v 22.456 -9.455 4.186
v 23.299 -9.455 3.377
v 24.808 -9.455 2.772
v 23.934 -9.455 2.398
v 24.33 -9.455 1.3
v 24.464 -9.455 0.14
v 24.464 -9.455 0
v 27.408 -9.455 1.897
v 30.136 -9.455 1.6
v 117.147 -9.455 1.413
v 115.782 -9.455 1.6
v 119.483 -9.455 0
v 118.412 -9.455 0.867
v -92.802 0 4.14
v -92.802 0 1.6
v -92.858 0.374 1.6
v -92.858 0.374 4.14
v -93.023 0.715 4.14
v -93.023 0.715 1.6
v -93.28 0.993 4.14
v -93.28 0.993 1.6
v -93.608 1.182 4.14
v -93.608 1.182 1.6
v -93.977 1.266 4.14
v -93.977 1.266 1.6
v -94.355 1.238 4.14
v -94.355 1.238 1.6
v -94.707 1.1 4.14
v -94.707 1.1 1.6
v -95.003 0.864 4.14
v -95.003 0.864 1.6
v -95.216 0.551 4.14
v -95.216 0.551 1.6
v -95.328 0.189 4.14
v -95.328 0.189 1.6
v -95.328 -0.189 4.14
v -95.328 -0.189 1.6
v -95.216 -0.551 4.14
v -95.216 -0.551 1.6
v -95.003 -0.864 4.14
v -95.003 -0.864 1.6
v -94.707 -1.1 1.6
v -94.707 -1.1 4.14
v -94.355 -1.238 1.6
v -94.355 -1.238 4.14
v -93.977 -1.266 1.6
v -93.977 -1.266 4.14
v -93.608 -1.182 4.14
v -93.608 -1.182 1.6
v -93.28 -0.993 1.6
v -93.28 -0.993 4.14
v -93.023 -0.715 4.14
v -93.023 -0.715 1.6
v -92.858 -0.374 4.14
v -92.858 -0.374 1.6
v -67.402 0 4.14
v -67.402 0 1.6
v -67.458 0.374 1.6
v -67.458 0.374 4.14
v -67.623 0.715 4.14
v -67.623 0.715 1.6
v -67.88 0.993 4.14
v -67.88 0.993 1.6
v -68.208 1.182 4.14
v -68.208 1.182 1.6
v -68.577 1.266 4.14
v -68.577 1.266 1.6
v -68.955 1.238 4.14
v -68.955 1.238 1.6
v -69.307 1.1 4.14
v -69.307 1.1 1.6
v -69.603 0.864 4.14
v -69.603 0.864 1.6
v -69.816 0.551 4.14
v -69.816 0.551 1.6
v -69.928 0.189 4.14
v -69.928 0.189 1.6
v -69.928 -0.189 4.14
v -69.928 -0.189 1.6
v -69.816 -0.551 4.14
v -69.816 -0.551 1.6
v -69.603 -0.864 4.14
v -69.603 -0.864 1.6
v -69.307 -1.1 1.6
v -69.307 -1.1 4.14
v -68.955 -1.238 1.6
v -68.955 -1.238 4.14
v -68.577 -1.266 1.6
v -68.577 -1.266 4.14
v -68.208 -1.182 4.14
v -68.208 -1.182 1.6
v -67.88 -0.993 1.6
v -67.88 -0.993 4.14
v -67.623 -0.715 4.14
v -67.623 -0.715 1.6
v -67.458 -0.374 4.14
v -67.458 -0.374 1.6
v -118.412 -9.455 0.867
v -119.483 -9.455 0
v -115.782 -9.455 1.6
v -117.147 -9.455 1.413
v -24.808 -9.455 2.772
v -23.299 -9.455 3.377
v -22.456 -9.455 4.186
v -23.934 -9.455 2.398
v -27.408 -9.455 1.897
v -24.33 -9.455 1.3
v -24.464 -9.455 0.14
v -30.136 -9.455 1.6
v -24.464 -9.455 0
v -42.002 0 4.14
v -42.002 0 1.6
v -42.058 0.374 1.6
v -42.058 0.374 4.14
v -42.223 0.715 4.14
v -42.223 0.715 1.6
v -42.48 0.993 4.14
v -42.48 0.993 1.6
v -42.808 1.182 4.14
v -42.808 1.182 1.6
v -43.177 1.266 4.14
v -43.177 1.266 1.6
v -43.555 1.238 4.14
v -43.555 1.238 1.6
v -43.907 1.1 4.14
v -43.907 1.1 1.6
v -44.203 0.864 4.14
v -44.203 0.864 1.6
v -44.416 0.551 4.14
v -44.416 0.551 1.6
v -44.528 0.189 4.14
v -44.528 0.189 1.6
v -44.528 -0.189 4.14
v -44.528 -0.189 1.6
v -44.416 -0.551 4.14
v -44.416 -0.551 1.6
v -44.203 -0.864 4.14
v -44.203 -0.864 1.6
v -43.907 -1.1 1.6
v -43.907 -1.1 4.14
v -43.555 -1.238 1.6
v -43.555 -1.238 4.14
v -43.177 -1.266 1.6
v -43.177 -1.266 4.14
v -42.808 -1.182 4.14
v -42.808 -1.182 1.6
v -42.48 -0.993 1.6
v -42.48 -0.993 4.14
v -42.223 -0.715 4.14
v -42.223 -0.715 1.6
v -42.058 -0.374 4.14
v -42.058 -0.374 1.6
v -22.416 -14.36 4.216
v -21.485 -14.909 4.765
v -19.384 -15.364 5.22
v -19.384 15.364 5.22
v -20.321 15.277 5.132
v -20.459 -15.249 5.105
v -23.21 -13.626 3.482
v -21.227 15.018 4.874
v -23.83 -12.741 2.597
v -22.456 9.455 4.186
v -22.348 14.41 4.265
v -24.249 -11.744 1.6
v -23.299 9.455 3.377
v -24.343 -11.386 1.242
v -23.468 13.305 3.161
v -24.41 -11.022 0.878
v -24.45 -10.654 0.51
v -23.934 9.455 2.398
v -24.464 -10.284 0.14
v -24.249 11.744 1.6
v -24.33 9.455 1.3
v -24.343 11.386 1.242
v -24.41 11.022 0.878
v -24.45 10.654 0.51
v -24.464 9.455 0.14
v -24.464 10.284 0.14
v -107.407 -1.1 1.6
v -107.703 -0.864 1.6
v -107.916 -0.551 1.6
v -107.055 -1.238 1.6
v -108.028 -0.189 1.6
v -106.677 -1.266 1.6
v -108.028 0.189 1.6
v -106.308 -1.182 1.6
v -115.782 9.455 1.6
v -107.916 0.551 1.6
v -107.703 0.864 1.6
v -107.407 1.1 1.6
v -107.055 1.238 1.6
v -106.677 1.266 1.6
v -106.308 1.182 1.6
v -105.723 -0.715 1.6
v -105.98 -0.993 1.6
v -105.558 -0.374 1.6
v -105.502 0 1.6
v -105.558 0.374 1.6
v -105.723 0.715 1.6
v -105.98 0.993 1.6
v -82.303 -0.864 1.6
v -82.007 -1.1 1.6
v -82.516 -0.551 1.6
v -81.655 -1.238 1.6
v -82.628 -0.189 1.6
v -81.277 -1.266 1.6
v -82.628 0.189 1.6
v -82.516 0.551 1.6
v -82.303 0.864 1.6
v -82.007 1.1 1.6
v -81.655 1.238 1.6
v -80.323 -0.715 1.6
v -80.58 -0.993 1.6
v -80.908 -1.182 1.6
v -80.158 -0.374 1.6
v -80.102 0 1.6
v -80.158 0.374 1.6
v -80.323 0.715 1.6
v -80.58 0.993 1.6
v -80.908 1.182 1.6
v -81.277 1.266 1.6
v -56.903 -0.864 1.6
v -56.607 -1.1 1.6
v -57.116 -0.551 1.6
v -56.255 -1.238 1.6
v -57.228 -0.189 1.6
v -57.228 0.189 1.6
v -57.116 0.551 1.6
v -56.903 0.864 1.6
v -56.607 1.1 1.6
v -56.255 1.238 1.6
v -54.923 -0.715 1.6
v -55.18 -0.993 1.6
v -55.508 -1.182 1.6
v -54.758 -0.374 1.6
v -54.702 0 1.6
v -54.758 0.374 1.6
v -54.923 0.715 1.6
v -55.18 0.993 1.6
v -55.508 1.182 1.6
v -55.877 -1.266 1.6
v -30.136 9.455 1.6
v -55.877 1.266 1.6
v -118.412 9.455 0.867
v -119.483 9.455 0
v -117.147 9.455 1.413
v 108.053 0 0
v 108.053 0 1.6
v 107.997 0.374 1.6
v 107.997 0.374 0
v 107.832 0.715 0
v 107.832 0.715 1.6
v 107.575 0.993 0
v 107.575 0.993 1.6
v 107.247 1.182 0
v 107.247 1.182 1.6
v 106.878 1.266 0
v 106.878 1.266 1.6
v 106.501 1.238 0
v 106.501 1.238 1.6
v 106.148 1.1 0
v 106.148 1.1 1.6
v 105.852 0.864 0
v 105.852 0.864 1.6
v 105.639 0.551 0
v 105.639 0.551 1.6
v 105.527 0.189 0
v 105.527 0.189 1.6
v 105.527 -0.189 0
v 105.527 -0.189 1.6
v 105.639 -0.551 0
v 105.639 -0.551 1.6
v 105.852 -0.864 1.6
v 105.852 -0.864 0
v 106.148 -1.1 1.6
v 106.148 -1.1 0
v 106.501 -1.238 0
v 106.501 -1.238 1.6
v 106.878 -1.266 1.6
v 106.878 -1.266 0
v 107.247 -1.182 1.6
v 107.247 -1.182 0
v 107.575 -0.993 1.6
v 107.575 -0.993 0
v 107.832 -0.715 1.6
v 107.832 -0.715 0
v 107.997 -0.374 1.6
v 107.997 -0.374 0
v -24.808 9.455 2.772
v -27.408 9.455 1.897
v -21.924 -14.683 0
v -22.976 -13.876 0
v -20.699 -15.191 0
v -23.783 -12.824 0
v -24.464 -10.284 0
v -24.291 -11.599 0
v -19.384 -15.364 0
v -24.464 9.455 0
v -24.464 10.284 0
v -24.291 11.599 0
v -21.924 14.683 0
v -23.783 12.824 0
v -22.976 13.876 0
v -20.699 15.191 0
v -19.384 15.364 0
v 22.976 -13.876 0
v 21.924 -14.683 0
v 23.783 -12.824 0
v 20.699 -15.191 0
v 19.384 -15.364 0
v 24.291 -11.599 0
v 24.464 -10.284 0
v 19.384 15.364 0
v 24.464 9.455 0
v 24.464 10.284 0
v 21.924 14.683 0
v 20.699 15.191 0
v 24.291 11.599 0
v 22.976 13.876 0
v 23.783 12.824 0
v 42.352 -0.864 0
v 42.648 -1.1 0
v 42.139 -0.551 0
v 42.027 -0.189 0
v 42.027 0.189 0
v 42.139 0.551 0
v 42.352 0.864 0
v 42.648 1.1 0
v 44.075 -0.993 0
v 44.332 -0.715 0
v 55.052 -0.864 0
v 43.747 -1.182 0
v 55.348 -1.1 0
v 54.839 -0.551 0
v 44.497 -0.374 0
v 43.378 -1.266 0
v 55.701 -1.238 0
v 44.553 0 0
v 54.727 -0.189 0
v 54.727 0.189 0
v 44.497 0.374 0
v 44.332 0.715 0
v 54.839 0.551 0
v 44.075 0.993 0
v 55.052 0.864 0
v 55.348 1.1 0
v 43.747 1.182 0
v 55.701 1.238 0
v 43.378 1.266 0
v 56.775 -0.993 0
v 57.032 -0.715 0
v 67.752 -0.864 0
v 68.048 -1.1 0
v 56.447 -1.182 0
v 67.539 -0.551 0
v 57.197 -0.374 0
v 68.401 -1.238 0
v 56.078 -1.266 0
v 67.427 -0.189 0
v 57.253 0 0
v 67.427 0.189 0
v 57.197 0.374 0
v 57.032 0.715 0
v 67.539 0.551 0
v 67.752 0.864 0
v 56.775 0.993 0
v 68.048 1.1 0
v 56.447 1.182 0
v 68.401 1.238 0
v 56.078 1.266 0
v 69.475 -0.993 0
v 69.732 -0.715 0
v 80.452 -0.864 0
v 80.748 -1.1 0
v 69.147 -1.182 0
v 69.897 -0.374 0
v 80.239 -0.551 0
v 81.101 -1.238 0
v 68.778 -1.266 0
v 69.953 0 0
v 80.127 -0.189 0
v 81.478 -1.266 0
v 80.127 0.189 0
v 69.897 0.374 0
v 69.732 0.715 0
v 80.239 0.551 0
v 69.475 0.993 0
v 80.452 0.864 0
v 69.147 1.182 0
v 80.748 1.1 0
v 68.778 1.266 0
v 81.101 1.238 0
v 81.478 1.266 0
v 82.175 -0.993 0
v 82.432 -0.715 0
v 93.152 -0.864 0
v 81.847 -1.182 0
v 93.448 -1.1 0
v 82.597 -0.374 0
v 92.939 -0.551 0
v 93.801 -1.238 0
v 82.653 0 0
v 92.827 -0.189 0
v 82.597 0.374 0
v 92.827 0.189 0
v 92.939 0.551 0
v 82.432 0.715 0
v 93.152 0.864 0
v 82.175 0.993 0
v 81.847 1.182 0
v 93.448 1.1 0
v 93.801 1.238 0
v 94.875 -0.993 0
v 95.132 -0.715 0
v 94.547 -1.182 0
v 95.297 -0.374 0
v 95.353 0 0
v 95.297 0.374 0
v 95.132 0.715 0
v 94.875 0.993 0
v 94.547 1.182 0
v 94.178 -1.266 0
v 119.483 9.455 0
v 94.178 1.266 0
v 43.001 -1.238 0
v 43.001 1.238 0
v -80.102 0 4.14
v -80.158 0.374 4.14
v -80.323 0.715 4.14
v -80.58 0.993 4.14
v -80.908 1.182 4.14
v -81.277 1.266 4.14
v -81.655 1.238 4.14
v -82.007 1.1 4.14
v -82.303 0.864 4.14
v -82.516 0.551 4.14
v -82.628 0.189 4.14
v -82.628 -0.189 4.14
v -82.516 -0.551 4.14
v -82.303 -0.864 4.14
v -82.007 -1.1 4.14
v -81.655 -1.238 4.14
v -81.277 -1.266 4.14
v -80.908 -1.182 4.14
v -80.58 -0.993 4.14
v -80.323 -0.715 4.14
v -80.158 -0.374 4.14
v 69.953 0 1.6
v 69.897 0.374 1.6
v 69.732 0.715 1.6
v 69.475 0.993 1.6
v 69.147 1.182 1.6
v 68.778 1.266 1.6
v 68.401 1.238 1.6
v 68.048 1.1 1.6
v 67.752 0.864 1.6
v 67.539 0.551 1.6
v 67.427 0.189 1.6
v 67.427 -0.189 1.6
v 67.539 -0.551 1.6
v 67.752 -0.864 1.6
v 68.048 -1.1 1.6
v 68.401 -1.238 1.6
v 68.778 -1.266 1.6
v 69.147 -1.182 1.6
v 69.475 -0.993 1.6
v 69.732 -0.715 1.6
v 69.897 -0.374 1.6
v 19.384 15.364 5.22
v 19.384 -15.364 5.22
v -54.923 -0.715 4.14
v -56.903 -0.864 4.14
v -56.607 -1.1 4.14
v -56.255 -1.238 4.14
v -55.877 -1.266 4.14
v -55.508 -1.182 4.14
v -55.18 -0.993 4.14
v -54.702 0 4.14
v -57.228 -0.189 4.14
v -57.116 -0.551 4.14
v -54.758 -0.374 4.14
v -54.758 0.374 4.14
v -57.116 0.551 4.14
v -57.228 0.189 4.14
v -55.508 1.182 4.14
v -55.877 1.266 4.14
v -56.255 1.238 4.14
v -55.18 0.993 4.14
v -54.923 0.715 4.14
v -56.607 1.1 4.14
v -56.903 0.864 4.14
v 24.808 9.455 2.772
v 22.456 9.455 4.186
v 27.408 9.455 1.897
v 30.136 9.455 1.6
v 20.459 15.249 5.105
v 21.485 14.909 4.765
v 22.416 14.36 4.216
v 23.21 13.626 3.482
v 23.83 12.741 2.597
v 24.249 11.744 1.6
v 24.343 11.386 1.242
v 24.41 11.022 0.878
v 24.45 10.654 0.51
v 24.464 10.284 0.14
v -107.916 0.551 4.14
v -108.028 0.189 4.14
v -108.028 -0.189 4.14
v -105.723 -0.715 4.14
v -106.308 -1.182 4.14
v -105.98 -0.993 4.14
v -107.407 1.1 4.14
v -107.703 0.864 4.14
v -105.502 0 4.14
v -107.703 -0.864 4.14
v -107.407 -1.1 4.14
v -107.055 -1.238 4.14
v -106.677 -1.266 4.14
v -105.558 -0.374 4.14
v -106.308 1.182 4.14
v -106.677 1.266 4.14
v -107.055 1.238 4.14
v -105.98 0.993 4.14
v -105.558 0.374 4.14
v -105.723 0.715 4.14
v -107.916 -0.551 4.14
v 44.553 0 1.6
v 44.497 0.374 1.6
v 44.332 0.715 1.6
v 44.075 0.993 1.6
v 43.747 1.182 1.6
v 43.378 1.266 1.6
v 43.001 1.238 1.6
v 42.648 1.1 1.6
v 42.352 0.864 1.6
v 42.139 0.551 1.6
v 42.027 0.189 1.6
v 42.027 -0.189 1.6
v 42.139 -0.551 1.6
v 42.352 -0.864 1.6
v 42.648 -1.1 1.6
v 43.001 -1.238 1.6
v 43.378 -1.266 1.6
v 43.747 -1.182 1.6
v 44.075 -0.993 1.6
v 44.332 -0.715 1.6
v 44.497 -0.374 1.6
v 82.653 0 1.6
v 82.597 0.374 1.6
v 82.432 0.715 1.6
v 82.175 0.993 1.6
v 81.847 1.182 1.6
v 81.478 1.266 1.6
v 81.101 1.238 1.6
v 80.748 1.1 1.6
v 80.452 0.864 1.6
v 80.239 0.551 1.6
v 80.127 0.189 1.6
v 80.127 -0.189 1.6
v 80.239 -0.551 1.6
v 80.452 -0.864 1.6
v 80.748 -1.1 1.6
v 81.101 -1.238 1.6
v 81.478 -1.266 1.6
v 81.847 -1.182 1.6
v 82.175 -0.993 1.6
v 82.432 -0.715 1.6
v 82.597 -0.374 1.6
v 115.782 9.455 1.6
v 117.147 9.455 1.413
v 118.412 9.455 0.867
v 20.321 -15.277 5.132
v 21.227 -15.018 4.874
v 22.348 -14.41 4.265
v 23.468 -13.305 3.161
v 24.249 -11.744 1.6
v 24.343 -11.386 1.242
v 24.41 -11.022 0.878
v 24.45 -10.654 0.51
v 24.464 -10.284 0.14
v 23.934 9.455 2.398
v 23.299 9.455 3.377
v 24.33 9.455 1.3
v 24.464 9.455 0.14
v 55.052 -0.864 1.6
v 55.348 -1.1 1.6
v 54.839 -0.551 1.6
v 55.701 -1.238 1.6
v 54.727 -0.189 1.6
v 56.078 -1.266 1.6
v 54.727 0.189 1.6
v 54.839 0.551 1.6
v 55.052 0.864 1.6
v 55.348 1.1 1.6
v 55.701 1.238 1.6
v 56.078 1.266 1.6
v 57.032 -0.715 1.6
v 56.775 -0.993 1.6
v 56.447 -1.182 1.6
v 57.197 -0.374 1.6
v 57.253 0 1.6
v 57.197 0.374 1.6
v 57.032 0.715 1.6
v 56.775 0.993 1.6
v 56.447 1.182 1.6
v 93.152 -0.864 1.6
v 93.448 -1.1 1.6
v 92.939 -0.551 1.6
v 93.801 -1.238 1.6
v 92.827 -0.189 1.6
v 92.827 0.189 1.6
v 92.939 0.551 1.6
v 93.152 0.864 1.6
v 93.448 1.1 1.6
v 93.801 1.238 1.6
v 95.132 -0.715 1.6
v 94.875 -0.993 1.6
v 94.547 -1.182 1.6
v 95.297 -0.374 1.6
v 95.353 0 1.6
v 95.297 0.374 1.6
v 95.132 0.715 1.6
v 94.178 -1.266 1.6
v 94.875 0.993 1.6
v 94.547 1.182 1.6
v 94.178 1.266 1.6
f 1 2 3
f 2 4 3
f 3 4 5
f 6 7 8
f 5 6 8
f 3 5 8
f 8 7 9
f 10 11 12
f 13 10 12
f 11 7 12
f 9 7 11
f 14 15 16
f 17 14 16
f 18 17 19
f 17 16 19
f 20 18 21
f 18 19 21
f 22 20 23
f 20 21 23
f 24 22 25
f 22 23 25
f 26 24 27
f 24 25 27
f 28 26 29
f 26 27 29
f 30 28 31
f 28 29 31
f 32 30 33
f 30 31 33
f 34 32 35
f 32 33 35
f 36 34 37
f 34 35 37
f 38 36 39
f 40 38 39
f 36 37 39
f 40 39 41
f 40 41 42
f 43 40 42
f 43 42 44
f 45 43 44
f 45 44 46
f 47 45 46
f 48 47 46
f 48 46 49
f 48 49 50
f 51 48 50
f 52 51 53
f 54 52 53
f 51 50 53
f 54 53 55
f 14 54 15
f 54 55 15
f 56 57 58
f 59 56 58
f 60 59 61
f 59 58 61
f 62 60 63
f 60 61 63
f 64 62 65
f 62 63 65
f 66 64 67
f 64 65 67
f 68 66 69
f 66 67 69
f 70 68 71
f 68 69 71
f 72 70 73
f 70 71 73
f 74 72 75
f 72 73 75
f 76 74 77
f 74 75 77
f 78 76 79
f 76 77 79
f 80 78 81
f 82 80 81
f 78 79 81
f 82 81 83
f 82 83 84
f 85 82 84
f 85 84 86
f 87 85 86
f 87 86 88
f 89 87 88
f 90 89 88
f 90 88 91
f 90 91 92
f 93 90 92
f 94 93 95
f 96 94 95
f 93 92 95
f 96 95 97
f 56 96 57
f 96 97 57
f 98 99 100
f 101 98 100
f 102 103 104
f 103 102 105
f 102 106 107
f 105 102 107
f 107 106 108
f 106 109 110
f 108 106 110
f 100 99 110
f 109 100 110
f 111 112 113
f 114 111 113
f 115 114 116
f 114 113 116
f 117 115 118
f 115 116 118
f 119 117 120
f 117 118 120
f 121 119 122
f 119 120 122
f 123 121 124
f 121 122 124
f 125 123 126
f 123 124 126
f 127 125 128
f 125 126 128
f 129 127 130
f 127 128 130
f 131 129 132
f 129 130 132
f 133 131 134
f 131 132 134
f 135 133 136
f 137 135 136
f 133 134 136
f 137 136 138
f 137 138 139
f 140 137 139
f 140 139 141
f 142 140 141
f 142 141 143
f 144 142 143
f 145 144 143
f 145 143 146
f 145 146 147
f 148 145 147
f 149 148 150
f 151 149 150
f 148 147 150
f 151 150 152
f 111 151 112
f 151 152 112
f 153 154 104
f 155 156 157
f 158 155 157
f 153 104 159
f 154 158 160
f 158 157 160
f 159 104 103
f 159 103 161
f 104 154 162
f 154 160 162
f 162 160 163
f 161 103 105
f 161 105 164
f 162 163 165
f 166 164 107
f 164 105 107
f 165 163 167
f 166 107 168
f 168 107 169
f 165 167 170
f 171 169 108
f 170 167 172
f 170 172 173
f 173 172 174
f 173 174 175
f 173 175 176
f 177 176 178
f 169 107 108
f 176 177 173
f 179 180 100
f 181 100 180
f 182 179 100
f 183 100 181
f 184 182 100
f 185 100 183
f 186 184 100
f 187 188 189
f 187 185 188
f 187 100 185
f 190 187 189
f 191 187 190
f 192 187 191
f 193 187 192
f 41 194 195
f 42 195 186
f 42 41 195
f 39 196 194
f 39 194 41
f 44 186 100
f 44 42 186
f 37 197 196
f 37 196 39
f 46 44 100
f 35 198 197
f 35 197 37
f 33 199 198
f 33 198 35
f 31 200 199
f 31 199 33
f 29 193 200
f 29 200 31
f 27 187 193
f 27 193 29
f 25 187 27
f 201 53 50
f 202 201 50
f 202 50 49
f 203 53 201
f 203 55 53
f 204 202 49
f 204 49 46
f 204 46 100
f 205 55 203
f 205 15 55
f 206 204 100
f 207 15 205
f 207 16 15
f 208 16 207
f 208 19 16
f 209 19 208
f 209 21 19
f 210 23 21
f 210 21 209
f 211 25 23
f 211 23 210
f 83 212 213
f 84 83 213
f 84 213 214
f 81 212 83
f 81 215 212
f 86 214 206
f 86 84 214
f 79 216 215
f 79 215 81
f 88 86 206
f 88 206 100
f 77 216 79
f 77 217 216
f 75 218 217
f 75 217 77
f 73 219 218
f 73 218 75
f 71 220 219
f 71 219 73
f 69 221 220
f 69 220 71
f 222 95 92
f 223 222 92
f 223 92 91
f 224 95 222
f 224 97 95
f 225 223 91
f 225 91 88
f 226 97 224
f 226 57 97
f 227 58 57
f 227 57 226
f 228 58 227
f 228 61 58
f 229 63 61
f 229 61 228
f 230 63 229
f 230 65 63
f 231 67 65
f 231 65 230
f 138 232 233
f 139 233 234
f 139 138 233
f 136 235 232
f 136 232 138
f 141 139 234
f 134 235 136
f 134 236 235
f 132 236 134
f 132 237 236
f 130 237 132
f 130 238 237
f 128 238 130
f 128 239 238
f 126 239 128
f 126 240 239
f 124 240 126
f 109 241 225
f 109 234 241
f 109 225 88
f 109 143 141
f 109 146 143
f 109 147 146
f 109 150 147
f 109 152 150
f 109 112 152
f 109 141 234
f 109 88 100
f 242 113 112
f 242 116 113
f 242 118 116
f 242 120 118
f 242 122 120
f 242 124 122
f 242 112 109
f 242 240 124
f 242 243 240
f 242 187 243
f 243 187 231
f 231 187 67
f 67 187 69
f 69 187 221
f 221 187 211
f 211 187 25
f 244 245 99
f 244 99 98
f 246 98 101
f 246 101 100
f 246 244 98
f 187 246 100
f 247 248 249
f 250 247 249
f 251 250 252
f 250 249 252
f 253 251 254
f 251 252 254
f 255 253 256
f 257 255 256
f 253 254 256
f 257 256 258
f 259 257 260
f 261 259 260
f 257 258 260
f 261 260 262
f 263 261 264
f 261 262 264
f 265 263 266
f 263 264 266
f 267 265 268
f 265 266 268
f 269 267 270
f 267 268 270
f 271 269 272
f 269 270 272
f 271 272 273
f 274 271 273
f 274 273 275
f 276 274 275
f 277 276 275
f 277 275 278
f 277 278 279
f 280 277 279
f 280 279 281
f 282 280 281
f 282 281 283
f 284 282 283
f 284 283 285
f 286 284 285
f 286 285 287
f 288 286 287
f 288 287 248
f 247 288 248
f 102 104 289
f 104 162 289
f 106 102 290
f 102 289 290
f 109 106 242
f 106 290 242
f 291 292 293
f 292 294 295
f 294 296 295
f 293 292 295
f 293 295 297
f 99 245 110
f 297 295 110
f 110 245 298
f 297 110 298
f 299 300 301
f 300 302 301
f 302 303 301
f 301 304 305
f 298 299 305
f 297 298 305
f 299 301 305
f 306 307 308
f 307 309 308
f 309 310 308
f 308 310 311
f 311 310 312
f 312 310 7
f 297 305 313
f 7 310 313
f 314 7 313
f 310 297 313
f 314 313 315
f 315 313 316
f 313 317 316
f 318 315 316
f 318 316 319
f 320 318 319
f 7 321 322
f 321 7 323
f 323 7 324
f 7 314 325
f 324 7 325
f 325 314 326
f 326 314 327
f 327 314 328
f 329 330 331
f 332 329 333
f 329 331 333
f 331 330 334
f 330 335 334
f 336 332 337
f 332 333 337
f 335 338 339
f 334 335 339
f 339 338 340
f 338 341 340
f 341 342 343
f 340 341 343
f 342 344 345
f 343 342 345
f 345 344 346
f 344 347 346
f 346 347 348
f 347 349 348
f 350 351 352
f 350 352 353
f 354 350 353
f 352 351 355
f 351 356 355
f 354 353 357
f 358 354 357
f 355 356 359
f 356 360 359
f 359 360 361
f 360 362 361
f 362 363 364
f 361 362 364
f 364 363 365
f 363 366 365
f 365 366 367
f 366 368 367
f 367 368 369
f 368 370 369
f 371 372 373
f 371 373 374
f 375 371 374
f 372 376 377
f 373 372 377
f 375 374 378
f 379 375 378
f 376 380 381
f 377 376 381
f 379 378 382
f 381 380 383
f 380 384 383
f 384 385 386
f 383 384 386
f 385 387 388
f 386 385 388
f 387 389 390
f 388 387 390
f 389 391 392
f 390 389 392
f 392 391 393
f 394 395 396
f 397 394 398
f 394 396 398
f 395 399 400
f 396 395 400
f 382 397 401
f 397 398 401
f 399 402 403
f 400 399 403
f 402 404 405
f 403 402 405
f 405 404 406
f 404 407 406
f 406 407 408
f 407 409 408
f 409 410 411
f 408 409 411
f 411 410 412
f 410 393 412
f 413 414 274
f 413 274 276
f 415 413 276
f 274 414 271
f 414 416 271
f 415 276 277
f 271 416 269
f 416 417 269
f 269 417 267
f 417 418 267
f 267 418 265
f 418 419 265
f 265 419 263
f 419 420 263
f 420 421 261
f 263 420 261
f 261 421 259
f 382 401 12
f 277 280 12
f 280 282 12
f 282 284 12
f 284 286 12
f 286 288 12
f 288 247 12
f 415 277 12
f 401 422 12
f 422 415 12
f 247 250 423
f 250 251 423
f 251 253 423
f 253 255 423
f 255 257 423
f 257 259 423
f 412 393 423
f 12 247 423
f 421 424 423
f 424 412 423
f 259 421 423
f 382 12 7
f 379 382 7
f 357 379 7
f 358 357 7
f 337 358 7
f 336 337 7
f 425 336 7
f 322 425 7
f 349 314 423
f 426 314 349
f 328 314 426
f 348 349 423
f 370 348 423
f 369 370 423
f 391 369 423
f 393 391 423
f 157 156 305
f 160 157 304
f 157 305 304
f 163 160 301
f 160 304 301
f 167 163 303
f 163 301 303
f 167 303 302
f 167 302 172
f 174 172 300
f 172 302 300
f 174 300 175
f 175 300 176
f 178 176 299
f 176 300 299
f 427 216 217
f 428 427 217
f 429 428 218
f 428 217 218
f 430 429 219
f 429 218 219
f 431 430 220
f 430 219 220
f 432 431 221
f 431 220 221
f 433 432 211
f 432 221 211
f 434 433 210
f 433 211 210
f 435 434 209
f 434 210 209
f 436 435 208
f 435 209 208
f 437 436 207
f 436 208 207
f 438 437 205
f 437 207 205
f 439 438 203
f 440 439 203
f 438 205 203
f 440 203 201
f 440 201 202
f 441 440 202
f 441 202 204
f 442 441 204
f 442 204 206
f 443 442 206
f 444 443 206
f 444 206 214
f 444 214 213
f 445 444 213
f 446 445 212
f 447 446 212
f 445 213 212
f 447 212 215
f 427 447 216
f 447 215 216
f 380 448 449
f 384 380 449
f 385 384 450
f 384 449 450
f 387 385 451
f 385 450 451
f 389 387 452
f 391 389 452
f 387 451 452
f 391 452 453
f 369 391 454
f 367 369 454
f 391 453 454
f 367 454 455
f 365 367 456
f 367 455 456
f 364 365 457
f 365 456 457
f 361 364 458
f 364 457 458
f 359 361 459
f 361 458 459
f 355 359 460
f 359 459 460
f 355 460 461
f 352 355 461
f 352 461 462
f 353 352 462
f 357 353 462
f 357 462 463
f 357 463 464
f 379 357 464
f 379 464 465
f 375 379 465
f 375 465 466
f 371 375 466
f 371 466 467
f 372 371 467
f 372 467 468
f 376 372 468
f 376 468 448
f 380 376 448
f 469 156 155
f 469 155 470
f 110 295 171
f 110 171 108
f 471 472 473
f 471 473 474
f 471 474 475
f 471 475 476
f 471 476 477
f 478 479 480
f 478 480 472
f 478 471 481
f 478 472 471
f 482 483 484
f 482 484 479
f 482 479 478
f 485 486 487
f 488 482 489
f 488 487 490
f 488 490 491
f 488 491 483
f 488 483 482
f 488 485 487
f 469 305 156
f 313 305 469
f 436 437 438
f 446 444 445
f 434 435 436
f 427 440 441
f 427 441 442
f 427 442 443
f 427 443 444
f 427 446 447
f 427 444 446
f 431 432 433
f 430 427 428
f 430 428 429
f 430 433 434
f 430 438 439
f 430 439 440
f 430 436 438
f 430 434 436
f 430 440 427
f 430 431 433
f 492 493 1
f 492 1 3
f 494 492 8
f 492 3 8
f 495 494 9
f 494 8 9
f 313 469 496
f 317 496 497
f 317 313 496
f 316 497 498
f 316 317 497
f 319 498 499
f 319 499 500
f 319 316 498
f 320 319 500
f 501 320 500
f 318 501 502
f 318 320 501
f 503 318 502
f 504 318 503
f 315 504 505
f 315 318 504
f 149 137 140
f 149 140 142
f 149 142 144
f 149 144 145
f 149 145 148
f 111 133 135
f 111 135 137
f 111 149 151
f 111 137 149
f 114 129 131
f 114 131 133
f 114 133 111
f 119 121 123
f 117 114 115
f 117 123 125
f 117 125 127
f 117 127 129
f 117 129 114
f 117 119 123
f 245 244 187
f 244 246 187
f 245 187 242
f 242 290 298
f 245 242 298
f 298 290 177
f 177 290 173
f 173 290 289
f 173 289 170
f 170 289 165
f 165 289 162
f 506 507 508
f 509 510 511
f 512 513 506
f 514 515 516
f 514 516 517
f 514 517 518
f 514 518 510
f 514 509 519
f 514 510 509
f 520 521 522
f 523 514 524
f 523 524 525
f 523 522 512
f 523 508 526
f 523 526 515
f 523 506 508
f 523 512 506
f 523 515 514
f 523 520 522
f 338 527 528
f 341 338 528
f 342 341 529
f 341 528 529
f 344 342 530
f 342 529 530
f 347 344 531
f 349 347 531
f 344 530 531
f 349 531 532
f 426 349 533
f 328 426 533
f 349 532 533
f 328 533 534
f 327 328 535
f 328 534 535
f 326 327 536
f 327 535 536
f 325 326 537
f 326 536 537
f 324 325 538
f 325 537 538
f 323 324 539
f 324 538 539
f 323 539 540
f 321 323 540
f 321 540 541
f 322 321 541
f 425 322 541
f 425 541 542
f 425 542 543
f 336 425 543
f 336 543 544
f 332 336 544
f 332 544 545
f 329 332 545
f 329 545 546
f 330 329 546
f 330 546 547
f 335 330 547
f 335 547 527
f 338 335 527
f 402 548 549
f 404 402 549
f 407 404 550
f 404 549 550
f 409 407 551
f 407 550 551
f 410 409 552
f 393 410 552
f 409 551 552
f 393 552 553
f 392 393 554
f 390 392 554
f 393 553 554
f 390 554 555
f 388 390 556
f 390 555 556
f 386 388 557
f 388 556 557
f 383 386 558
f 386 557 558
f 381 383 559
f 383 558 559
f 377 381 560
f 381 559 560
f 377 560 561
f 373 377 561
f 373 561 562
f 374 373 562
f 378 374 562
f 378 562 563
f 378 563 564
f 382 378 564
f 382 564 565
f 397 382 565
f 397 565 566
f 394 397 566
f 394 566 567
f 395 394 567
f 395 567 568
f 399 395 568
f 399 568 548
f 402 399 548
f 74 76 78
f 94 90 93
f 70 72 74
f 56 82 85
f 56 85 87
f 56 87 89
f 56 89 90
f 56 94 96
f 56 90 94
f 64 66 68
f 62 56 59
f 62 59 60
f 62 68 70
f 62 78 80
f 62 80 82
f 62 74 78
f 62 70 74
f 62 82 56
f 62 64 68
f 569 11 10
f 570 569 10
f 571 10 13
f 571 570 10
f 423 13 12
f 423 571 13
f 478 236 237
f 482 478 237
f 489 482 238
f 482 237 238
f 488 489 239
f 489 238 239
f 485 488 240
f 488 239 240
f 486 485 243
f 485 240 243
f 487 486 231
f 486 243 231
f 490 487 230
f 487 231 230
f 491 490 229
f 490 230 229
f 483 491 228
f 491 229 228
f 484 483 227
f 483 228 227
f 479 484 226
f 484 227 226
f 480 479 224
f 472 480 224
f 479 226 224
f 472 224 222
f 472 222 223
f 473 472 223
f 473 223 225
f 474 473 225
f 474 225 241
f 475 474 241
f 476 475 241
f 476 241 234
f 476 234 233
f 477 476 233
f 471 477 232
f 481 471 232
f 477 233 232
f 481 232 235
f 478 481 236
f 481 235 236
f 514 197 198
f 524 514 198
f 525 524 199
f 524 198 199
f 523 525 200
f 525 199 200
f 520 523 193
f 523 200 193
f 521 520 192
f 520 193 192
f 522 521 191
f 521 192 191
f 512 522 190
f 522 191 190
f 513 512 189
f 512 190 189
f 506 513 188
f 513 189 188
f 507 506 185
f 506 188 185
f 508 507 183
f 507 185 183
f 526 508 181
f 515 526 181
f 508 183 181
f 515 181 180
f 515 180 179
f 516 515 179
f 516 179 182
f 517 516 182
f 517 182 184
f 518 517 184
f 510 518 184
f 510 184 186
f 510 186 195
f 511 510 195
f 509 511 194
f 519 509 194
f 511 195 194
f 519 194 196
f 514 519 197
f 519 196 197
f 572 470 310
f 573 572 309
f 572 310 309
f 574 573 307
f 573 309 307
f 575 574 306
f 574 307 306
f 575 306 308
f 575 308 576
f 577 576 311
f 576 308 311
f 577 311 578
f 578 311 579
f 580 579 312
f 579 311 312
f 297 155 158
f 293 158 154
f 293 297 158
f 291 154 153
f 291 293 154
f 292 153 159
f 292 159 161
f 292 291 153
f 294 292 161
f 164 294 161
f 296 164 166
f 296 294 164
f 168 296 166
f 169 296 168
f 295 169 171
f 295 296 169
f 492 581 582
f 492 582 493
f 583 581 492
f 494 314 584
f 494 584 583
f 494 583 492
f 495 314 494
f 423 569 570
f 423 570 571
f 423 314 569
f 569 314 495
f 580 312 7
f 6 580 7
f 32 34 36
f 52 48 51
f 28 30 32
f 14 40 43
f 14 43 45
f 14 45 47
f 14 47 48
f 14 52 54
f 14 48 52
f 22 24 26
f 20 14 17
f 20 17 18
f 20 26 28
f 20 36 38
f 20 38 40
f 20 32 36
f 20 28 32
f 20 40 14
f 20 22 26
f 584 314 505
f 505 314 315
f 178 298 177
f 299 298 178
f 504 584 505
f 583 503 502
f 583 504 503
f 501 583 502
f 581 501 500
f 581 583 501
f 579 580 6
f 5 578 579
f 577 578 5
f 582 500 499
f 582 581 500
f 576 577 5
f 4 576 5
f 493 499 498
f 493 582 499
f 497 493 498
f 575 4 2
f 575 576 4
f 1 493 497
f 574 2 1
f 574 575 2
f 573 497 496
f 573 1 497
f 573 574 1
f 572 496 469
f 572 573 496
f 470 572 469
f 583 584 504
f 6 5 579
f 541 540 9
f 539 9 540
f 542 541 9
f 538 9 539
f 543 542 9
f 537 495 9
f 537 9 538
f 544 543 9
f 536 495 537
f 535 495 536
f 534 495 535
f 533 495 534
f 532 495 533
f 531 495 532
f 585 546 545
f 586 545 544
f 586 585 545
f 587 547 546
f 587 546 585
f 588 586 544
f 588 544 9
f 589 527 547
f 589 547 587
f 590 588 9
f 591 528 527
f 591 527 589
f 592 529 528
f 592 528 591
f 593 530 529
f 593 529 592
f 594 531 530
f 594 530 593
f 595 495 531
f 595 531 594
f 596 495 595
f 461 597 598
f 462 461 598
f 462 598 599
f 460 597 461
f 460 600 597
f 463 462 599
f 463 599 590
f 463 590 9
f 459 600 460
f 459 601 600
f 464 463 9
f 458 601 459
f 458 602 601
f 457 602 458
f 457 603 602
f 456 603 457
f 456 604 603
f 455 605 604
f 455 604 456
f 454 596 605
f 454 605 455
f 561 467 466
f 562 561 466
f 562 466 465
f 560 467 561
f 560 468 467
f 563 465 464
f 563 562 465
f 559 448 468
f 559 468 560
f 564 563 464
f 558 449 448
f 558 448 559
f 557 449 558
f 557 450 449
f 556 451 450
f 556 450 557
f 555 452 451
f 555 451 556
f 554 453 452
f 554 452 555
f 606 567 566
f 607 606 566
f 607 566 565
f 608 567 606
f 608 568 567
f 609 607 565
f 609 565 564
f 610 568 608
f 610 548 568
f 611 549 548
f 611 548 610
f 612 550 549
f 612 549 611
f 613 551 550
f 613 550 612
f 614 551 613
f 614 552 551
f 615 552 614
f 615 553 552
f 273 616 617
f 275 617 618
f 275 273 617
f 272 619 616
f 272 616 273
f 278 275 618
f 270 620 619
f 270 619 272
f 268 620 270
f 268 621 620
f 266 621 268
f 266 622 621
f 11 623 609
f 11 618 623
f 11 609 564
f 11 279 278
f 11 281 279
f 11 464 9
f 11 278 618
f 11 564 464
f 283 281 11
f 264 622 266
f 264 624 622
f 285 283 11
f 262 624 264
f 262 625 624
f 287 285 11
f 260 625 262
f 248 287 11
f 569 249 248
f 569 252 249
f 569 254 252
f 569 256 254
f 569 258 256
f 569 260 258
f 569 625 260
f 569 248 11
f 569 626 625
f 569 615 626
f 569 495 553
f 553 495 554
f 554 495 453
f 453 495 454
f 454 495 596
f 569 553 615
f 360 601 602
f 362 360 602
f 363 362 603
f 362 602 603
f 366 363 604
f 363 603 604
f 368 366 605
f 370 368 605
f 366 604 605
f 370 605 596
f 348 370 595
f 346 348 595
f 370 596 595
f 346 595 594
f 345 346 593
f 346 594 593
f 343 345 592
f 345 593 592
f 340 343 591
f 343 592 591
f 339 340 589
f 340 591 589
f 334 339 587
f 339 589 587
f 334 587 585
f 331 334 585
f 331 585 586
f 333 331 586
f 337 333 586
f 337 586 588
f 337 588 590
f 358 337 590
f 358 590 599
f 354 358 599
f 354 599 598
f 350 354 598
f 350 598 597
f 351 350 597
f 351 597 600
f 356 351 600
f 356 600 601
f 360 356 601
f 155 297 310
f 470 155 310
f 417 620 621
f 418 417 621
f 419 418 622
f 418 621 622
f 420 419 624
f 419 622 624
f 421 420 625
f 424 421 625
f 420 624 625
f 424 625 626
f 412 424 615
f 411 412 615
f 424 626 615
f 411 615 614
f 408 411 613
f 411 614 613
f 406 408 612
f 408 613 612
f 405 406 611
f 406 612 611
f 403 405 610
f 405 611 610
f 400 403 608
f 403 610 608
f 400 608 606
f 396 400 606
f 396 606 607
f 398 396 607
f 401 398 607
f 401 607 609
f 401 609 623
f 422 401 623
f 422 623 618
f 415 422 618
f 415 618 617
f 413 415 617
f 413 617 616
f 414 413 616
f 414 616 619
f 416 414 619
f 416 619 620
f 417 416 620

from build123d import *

# Parameters (mm, degrees)
F0_W         = 95.0192604214
F0_H         = 18.9093053341
F1_DEPTH     = 1.6002
F2_R         = 1.27
F3_DEPTH     = 25.4
F4_R         = 1.27
F5_DEPTH     = 2.54
F6_W         = 48.927821219
F6_H         = 30.7276230305
F7_DEPTH     = 3.6195
F8_T1_DEPTH  = 30.6197
F8_T6_DEPTH  = 56.1276230305
F8_T12_DEPTH = 56.1276230305
F8_T18_DEPTH = 56.1276230305
F8_T25_DEPTH = 56.1276230305
F8_T31_DEPTH = 56.1276230305
F8_T37_DEPTH = 56.1276230305
F8_T43_DEPTH = 56.1276230305
F8_T49_DEPTH = 56.1276230305
F8_T56_DEPTH = 56.1276230305
F8_T62_DEPTH = 56.1276230305
F9_T1_DEPTH  = 37.4142992276
F10_R        = 12.7


# Not quite as in the source:
# - a fillet or chamfer that OpenCascade refuses, or shapes differently, is made with other operations: its cross-section is extruded or revolved along the edge and cut away or added


with BuildPart() as f1:
    # F0 (on Top) → F1 (new body)
    with BuildSketch(Plane.XY):
        Polygon((-24.4639106095, -15.3638115153), (24.4639106095, -15.3638115153), (24.4639106095, -9.454652667), (24.4639106095, 9.454652667), (24.4639106095, 15.3638115153), (-24.4639106095, 15.3638115153), (-24.4639106095, 9.454652667), (-24.4639106095, -9.454652667), align=None)
        with Locations((71.9735408202, 0)):
            Rectangle(F0_W, F0_H)
        with Locations((-71.9735408202, 0)):
            Rectangle(F0_W, F0_H)
    extrude(amount=F1_DEPTH)

    # F2 (on face) → F3 (cut)
    with BuildSketch(Plane.XY.offset(1.6002)):
        with Locations((106.7831710309, 0)):
            Circle(F2_R)
        with Locations((94.0831710309, 0)):
            Circle(F2_R)
        with Locations((81.3831710309, 0)):
            Circle(F2_R)
        with Locations((68.6831710309, 0)):
            Circle(F2_R)
        with Locations((55.9831710309, 0)):
            Circle(F2_R)
        with Locations((43.2831710309, 0)):
            Circle(F2_R)
    extrude(amount=-F3_DEPTH, mode=Mode.SUBTRACT)

    # F4 (on face) → F5 (join)
    with BuildSketch(Plane.XY.offset(1.6002)):
        with Locations((-106.7719441229, 0)):
            Circle(F4_R)
        with Locations((-94.0719441229, 0)):
            Circle(F4_R)
        with Locations((-81.3719441229, 0)):
            Circle(F4_R)
        with Locations((-68.6719441229, 0)):
            Circle(F4_R)
        with Locations((-55.9719441229, 0)):
            Circle(F4_R)
        with Locations((-43.2719441229, 0)):
            Circle(F4_R)
    extrude(amount=F5_DEPTH)

    # F6 (on face) → F7 (join)
    with BuildSketch(Plane.XY.offset(1.6002)):
        Rectangle(F6_W, F6_H)
    extrude(amount=F7_DEPTH)

    # F8: fillet of radius 5.08 on 6 edges, made by hand

    # F8_s2 → F8_t1 (cut)
    with BuildSketch(Plane.XY.offset(-12.7)):
        with BuildLine():
            ThreePointArc((-19.3839106095, 15.3638115153), (-22.9760130579, 13.8759139637), (-24.4639106095, 10.2838115153))
            Line((-24.4639106095, 10.2838115153), (-24.4639106095, 15.3638115153))
            Line((-24.4639106095, 15.3638115153), (-19.3839106095, 15.3638115153))
        make_face()
        with BuildLine():
            ThreePointArc((-19.3839106095, -15.3638115153), (-22.9760130579, -13.8759139637), (-24.4639106095, -10.2838115153))
            Line((-24.4639106095, -10.2838115153), (-24.4639106095, -15.3638115153))
            Line((-24.4639106095, -15.3638115153), (-19.3839106095, -15.3638115153))
        make_face()
        with BuildLine():
            ThreePointArc((19.3839106095, -15.3638115153), (22.9760130579, -13.8759139637), (24.4639106095, -10.2838115153))
            Line((24.4639106095, -10.2838115153), (24.4639106095, -15.3638115153))
            Line((24.4639106095, -15.3638115153), (19.3839106095, -15.3638115153))
        make_face()
        with BuildLine():
            ThreePointArc((19.3839106095, 15.3638115153), (22.9760130579, 13.8759139637), (24.4639106095, 10.2838115153))
            Line((24.4639106095, 10.2838115153), (24.4639106095, 15.3638115153))
            Line((24.4639106095, 15.3638115153), (19.3839106095, 15.3638115153))
        make_face()
    extrude(amount=F8_T1_DEPTH, mode=Mode.SUBTRACT)


with BuildPart() as f8_tool4:
    # F8_s5 → F8_t6 (new body)
    with BuildSketch(Plane.XZ.offset(28.0638115153)):
        with BuildLine():
            ThreePointArc((24.4639106095, 0.1397), (22.9760130579, 3.7318024484), (19.3839106095, 5.2197))
            Line((19.3839106095, 5.2197), (24.4639106095, 5.2197))
            Line((24.4639106095, 5.2197), (24.4639106095, 0.1397))
        make_face()
    extrude(amount=-F8_T6_DEPTH)

    split(bisect_by=Plane.XY.offset(1.6002), keep=Keep.BOTTOM)

    split(bisect_by=Plane.XZ.offset(9.454652667), keep=Keep.TOP)


with BuildPart() as f1_1:
    add(f1.part)

    # F8_t3: cut F8_tool4
    add(f8_tool4.part, mode=Mode.SUBTRACT)


with BuildPart() as f8_tool10:
    # F8_s11 → F8_t12 (new body)
    with BuildSketch(Plane.XZ.offset(28.0638115153)):
        with BuildLine():
            ThreePointArc((24.4639106095, 0.1397), (22.9760130579, 3.7318024484), (19.3839106095, 5.2197))
            Line((19.3839106095, 5.2197), (24.4639106095, 5.2197))
            Line((24.4639106095, 5.2197), (24.4639106095, 0.1397))
        make_face()
    extrude(amount=-F8_T12_DEPTH)

    split(bisect_by=Plane.XY.offset(1.6002), keep=Keep.TOP)

    split(bisect_by=Plane.XZ.offset(9.454652667), keep=Keep.TOP)


with BuildPart() as f1_2:
    add(f1_1.part)

    # F8_t9: cut F8_tool10
    add(f8_tool10.part, mode=Mode.SUBTRACT)


with BuildPart() as f8_tool16:
    # F8_s17 → F8_t18 (new body)
    with BuildSketch(Plane.XZ.offset(28.0638115153)):
        with BuildLine():
            ThreePointArc((24.4639106095, 0.1397), (22.9760130579, 3.7318024484), (19.3839106095, 5.2197))
            Line((19.3839106095, 5.2197), (24.4639106095, 5.2197))
            Line((24.4639106095, 5.2197), (24.4639106095, 0.1397))
        make_face()
    extrude(amount=-F8_T18_DEPTH)

    split(bisect_by=Plane.XY.offset(1.6002), keep=Keep.TOP)

    split(bisect_by=Plane.XZ.offset(-9.454652667), keep=Keep.TOP)

    split(bisect_by=Plane.XZ.offset(9.454652667), keep=Keep.BOTTOM)


with BuildPart() as f1_3:
    add(f1_2.part)

    # F8_t15: cut F8_tool16
    add(f8_tool16.part, mode=Mode.SUBTRACT)


with BuildPart() as f8_tool23:
    # F8_s24 → F8_t25 (new body)
    with BuildSketch(Plane.XZ.offset(28.0638115153)):
        with BuildLine():
            ThreePointArc((24.4639106095, 0.1397), (22.9760130579, 3.7318024484), (19.3839106095, 5.2197))
            Line((19.3839106095, 5.2197), (24.4639106095, 5.2197))
            Line((24.4639106095, 5.2197), (24.4639106095, 0.1397))
        make_face()
    extrude(amount=-F8_T25_DEPTH)

    split(bisect_by=Plane.XY.offset(1.6002), keep=Keep.BOTTOM)

    split(bisect_by=Plane.XZ.offset(-9.454652667), keep=Keep.BOTTOM)


with BuildPart() as f1_4:
    add(f1_3.part)

    # F8_t22: cut F8_tool23
    add(f8_tool23.part, mode=Mode.SUBTRACT)


with BuildPart() as f8_tool29:
    # F8_s30 → F8_t31 (new body)
    with BuildSketch(Plane.XZ.offset(28.0638115153)):
        with BuildLine():
            ThreePointArc((24.4639106095, 0.1397), (22.9760130579, 3.7318024484), (19.3839106095, 5.2197))
            Line((19.3839106095, 5.2197), (24.4639106095, 5.2197))
            Line((24.4639106095, 5.2197), (24.4639106095, 0.1397))
        make_face()
    extrude(amount=-F8_T31_DEPTH)

    split(bisect_by=Plane.XY.offset(1.6002), keep=Keep.TOP)

    split(bisect_by=Plane.XZ.offset(-9.454652667), keep=Keep.BOTTOM)


with BuildPart() as f1_5:
    add(f1_4.part)

    # F8_t28: cut F8_tool29
    add(f8_tool29.part, mode=Mode.SUBTRACT)


with BuildPart() as f8_tool35:
    # F8_s36 → F8_t37 (new body)
    with BuildSketch(Plane.XZ.offset(-28.0638115153)):
        with BuildLine():
            ThreePointArc((-19.3839106095, 5.2197), (-22.9760130579, 3.7318024484), (-24.4639106095, 0.1397))
            Line((-24.4639106095, 0.1397), (-24.4639106095, 5.2197))
            Line((-24.4639106095, 5.2197), (-19.3839106095, 5.2197))
        make_face()
    extrude(amount=F8_T37_DEPTH)

    split(bisect_by=Plane.XZ.offset(-9.454652667), keep=Keep.BOTTOM)

    split(bisect_by=Plane.XY.offset(1.6002), keep=Keep.TOP)


with BuildPart() as f1_6:
    add(f1_5.part)

    # F8_t34: cut F8_tool35
    add(f8_tool35.part, mode=Mode.SUBTRACT)


with BuildPart() as f8_tool41:
    # F8_s42 → F8_t43 (new body)
    with BuildSketch(Plane.XZ.offset(-28.0638115153)):
        with BuildLine():
            ThreePointArc((-19.3839106095, 5.2197), (-22.9760130579, 3.7318024484), (-24.4639106095, 0.1397))
            Line((-24.4639106095, 0.1397), (-24.4639106095, 5.2197))
            Line((-24.4639106095, 5.2197), (-19.3839106095, 5.2197))
        make_face()
    extrude(amount=F8_T43_DEPTH)

    split(bisect_by=Plane.XZ.offset(-9.454652667), keep=Keep.BOTTOM)

    split(bisect_by=Plane.XY.offset(1.6002), keep=Keep.BOTTOM)


with BuildPart() as f1_7:
    add(f1_6.part)

    # F8_t40: cut F8_tool41
    add(f8_tool41.part, mode=Mode.SUBTRACT)


with BuildPart() as f8_tool47:
    # F8_s48 → F8_t49 (new body)
    with BuildSketch(Plane.XZ.offset(-28.0638115153)):
        with BuildLine():
            ThreePointArc((-19.3839106095, 5.2197), (-22.9760130579, 3.7318024484), (-24.4639106095, 0.1397))
            Line((-24.4639106095, 0.1397), (-24.4639106095, 5.2197))
            Line((-24.4639106095, 5.2197), (-19.3839106095, 5.2197))
        make_face()
    extrude(amount=F8_T49_DEPTH)

    split(bisect_by=Plane.XZ.offset(-9.454652667), keep=Keep.TOP)

    split(bisect_by=Plane.XY.offset(1.6002), keep=Keep.TOP)

    split(bisect_by=Plane.XZ.offset(9.454652667), keep=Keep.BOTTOM)


with BuildPart() as f1_8:
    add(f1_7.part)

    # F8_t46: cut F8_tool47
    add(f8_tool47.part, mode=Mode.SUBTRACT)


with BuildPart() as f8_tool54:
    # F8_s55 → F8_t56 (new body)
    with BuildSketch(Plane.XZ.offset(-28.0638115153)):
        with BuildLine():
            ThreePointArc((-19.3839106095, 5.2197), (-22.9760130579, 3.7318024484), (-24.4639106095, 0.1397))
            Line((-24.4639106095, 0.1397), (-24.4639106095, 5.2197))
            Line((-24.4639106095, 5.2197), (-19.3839106095, 5.2197))
        make_face()
    extrude(amount=F8_T56_DEPTH)

    split(bisect_by=Plane.XY.offset(1.6002), keep=Keep.TOP)

    split(bisect_by=Plane.XZ.offset(9.454652667), keep=Keep.TOP)


with BuildPart() as f1_9:
    add(f1_8.part)

    # F8_t53: cut F8_tool54
    add(f8_tool54.part, mode=Mode.SUBTRACT)


with BuildPart() as f8_tool60:
    # F8_s61 → F8_t62 (new body)
    with BuildSketch(Plane.XZ.offset(-28.0638115153)):
        with BuildLine():
            ThreePointArc((-19.3839106095, 5.2197), (-22.9760130579, 3.7318024484), (-24.4639106095, 0.1397))
            Line((-24.4639106095, 0.1397), (-24.4639106095, 5.2197))
            Line((-24.4639106095, 5.2197), (-19.3839106095, 5.2197))
        make_face()
    extrude(amount=F8_T62_DEPTH)

    split(bisect_by=Plane.XY.offset(1.6002), keep=Keep.BOTTOM)

    split(bisect_by=Plane.XZ.offset(9.454652667), keep=Keep.TOP)


with BuildPart() as f1_10:
    add(f1_9.part)

    # F8_t59: cut F8_tool60
    add(f8_tool60.part, mode=Mode.SUBTRACT)

    # F9: fillet of radius 5.08 on 2 edges, made by hand

    # F9_s2 → F9_t1 (cut)
    with BuildSketch(Plane.XZ.offset(-18.7071496138)):
        with BuildLine():
            ThreePointArc((115.7821722522, 1.6002), (117.7982347512, 1.1830201767), (119.4831710309, 0))
            Line((119.4831710309, 0), (119.4831710309, 1.6002))
            Line((119.4831710309, 1.6002), (115.7821722522, 1.6002))
        make_face()
        with BuildLine():
            ThreePointArc((-119.4831710309, 0), (-117.7982347512, 1.1830201767), (-115.7821722522, 1.6002))
            Line((-115.7821722522, 1.6002), (-119.4831710309, 1.6002))
            Line((-119.4831710309, 1.6002), (-119.4831710309, 0))
        make_face()
    extrude(amount=F9_T1_DEPTH, mode=Mode.SUBTRACT)

    # F10
    f10_edges = [f1_10.edges().sort_by_distance(p)[0] for p in [
        (24.249436, 0, 1.6002),
        (-24.249436, 0, 1.6002),
    ]]
    fillet(f10_edges, radius=F10_R)


solid = f1_10.part
